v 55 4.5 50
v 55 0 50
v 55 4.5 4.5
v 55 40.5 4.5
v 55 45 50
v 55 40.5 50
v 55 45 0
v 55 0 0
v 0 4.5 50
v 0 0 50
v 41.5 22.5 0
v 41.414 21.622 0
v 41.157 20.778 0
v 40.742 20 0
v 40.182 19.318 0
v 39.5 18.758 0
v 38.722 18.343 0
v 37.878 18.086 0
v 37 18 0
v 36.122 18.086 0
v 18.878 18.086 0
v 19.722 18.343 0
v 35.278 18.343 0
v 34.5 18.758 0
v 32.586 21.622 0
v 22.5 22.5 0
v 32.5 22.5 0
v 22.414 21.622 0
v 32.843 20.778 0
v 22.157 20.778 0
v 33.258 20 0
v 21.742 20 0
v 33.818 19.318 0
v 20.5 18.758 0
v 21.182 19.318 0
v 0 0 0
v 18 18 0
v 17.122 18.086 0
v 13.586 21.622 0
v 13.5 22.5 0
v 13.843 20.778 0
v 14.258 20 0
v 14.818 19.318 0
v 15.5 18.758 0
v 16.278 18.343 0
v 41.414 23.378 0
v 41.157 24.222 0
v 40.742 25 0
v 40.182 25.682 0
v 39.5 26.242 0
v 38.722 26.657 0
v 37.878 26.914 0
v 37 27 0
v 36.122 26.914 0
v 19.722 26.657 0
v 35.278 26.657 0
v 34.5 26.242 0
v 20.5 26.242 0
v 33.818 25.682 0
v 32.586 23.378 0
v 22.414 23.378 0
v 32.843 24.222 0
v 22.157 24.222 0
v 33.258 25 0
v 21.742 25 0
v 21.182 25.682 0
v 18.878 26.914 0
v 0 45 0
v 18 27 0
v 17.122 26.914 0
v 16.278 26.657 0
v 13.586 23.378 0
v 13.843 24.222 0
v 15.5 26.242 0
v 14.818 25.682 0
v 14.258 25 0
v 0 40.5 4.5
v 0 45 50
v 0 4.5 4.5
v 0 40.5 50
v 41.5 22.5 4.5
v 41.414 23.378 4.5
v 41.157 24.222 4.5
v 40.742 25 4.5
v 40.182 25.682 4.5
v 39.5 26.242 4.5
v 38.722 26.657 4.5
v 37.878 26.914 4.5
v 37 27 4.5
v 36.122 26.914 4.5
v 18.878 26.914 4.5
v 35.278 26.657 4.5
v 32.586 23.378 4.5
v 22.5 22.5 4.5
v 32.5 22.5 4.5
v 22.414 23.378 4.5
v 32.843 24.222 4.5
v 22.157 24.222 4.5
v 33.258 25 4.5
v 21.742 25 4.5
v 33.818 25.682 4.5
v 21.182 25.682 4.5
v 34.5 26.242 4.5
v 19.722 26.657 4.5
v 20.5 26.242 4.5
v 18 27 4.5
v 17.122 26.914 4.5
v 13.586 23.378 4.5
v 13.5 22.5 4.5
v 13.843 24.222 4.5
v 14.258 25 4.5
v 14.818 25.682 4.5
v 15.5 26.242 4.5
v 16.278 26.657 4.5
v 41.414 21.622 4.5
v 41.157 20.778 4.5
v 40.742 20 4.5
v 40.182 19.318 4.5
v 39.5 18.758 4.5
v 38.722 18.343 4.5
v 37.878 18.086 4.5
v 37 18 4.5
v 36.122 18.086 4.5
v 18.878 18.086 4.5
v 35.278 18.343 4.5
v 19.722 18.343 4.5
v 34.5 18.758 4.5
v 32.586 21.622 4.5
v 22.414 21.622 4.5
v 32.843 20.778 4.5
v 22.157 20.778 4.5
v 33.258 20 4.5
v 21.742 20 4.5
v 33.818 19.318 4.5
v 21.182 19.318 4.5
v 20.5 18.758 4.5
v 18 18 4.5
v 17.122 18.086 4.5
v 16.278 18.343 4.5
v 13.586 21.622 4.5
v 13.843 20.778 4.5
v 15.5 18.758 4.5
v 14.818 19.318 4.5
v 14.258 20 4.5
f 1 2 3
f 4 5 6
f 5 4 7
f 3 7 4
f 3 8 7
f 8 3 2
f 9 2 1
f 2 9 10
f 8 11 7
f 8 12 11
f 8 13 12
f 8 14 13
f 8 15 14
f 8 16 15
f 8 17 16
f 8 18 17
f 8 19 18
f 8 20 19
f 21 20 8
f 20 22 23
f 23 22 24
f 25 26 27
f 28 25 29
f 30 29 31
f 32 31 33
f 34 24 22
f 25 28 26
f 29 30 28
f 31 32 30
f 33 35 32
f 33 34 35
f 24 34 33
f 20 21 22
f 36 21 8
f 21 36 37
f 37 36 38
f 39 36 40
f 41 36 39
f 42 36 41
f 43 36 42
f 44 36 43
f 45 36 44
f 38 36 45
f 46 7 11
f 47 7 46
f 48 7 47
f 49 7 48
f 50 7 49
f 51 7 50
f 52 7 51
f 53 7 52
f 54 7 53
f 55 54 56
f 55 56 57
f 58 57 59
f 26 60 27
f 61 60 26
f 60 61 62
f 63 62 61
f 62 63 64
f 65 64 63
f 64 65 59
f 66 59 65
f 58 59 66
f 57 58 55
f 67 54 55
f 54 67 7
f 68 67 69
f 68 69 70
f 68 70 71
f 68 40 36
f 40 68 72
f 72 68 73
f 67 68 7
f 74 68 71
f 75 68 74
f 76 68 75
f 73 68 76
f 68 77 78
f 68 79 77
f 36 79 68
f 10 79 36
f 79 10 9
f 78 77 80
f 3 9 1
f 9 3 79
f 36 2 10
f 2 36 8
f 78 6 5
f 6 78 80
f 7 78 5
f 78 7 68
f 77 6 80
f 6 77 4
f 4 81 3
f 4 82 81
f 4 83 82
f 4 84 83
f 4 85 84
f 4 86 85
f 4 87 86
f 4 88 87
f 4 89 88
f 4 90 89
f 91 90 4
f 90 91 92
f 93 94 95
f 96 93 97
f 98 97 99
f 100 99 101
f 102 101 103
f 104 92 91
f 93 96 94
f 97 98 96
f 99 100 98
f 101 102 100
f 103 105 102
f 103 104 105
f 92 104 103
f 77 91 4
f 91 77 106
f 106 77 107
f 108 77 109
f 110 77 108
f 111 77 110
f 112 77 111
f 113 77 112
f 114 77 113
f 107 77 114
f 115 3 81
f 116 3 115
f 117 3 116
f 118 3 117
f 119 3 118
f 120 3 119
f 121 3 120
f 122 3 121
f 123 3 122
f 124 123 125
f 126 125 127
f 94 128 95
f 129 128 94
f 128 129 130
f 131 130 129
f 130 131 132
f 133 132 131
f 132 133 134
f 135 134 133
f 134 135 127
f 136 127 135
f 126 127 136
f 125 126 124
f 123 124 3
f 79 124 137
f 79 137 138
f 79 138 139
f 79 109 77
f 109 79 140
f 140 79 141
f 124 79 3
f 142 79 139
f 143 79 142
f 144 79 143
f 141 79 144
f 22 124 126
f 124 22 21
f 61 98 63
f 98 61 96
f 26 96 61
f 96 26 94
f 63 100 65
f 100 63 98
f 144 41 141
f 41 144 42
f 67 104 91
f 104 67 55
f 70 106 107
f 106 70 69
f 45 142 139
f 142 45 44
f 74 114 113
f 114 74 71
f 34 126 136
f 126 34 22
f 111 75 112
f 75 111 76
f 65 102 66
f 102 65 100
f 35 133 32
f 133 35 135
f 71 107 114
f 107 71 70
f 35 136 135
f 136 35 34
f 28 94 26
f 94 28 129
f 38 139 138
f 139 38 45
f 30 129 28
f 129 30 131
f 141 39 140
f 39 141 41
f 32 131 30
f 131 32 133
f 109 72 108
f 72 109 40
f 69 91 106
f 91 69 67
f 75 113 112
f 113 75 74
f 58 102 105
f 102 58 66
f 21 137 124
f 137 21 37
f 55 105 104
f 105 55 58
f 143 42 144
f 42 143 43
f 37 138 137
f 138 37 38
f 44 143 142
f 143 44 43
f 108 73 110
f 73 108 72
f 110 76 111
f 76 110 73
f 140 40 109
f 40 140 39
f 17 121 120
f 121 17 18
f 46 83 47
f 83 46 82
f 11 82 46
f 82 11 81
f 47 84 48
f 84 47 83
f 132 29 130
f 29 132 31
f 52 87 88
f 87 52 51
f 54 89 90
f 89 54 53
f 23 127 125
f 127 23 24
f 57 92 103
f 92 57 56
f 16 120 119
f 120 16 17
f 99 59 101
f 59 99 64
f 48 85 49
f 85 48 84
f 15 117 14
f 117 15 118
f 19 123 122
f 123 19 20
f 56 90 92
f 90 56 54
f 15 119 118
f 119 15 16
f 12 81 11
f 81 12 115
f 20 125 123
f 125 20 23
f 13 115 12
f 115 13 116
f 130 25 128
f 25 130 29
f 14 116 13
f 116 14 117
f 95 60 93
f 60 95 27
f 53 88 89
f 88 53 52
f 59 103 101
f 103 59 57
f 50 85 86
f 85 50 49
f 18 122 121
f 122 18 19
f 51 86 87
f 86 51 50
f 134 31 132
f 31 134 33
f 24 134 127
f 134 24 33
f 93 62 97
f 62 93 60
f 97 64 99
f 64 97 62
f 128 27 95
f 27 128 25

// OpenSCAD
$fn = 32;

// ----------------------------------------------------------------------
// U-bracket: 55 x 45 x 50 mm
// ----------------------------------------------------------------------

// --- parameters (mm) ---
base_len = 55;            // outer length, X
channel_w = 45;           // outer width, Y
upright_h = 50;           // upright height, Z
mat_t = 4.5;              // wall thickness
hole_d = 9;               // clearance for M8

module hole_z(px, py) {
  translate([px, py, -0.5]) cylinder(h = mat_t + 1, d = hole_d);
}
module hole_y_pz(pz) {
  /* through both uprights along Y */
  translate([0, -0.5, pz]) rotate([-90, 0, 0]) cylinder(h = channel_w + 1, d = hole_d);
}

module base() {
  cube([base_len, channel_w, mat_t]);
}

module uprights() {
  cube([base_len, mat_t, upright_h]);
  translate([0, channel_w - mat_t, 0]) cube([base_len, mat_t, upright_h]);
}

difference() {
  union() {
    base();
    uprights();
  }
  hole_z(18, 22.5);
  hole_z(37, 22.5);
}
